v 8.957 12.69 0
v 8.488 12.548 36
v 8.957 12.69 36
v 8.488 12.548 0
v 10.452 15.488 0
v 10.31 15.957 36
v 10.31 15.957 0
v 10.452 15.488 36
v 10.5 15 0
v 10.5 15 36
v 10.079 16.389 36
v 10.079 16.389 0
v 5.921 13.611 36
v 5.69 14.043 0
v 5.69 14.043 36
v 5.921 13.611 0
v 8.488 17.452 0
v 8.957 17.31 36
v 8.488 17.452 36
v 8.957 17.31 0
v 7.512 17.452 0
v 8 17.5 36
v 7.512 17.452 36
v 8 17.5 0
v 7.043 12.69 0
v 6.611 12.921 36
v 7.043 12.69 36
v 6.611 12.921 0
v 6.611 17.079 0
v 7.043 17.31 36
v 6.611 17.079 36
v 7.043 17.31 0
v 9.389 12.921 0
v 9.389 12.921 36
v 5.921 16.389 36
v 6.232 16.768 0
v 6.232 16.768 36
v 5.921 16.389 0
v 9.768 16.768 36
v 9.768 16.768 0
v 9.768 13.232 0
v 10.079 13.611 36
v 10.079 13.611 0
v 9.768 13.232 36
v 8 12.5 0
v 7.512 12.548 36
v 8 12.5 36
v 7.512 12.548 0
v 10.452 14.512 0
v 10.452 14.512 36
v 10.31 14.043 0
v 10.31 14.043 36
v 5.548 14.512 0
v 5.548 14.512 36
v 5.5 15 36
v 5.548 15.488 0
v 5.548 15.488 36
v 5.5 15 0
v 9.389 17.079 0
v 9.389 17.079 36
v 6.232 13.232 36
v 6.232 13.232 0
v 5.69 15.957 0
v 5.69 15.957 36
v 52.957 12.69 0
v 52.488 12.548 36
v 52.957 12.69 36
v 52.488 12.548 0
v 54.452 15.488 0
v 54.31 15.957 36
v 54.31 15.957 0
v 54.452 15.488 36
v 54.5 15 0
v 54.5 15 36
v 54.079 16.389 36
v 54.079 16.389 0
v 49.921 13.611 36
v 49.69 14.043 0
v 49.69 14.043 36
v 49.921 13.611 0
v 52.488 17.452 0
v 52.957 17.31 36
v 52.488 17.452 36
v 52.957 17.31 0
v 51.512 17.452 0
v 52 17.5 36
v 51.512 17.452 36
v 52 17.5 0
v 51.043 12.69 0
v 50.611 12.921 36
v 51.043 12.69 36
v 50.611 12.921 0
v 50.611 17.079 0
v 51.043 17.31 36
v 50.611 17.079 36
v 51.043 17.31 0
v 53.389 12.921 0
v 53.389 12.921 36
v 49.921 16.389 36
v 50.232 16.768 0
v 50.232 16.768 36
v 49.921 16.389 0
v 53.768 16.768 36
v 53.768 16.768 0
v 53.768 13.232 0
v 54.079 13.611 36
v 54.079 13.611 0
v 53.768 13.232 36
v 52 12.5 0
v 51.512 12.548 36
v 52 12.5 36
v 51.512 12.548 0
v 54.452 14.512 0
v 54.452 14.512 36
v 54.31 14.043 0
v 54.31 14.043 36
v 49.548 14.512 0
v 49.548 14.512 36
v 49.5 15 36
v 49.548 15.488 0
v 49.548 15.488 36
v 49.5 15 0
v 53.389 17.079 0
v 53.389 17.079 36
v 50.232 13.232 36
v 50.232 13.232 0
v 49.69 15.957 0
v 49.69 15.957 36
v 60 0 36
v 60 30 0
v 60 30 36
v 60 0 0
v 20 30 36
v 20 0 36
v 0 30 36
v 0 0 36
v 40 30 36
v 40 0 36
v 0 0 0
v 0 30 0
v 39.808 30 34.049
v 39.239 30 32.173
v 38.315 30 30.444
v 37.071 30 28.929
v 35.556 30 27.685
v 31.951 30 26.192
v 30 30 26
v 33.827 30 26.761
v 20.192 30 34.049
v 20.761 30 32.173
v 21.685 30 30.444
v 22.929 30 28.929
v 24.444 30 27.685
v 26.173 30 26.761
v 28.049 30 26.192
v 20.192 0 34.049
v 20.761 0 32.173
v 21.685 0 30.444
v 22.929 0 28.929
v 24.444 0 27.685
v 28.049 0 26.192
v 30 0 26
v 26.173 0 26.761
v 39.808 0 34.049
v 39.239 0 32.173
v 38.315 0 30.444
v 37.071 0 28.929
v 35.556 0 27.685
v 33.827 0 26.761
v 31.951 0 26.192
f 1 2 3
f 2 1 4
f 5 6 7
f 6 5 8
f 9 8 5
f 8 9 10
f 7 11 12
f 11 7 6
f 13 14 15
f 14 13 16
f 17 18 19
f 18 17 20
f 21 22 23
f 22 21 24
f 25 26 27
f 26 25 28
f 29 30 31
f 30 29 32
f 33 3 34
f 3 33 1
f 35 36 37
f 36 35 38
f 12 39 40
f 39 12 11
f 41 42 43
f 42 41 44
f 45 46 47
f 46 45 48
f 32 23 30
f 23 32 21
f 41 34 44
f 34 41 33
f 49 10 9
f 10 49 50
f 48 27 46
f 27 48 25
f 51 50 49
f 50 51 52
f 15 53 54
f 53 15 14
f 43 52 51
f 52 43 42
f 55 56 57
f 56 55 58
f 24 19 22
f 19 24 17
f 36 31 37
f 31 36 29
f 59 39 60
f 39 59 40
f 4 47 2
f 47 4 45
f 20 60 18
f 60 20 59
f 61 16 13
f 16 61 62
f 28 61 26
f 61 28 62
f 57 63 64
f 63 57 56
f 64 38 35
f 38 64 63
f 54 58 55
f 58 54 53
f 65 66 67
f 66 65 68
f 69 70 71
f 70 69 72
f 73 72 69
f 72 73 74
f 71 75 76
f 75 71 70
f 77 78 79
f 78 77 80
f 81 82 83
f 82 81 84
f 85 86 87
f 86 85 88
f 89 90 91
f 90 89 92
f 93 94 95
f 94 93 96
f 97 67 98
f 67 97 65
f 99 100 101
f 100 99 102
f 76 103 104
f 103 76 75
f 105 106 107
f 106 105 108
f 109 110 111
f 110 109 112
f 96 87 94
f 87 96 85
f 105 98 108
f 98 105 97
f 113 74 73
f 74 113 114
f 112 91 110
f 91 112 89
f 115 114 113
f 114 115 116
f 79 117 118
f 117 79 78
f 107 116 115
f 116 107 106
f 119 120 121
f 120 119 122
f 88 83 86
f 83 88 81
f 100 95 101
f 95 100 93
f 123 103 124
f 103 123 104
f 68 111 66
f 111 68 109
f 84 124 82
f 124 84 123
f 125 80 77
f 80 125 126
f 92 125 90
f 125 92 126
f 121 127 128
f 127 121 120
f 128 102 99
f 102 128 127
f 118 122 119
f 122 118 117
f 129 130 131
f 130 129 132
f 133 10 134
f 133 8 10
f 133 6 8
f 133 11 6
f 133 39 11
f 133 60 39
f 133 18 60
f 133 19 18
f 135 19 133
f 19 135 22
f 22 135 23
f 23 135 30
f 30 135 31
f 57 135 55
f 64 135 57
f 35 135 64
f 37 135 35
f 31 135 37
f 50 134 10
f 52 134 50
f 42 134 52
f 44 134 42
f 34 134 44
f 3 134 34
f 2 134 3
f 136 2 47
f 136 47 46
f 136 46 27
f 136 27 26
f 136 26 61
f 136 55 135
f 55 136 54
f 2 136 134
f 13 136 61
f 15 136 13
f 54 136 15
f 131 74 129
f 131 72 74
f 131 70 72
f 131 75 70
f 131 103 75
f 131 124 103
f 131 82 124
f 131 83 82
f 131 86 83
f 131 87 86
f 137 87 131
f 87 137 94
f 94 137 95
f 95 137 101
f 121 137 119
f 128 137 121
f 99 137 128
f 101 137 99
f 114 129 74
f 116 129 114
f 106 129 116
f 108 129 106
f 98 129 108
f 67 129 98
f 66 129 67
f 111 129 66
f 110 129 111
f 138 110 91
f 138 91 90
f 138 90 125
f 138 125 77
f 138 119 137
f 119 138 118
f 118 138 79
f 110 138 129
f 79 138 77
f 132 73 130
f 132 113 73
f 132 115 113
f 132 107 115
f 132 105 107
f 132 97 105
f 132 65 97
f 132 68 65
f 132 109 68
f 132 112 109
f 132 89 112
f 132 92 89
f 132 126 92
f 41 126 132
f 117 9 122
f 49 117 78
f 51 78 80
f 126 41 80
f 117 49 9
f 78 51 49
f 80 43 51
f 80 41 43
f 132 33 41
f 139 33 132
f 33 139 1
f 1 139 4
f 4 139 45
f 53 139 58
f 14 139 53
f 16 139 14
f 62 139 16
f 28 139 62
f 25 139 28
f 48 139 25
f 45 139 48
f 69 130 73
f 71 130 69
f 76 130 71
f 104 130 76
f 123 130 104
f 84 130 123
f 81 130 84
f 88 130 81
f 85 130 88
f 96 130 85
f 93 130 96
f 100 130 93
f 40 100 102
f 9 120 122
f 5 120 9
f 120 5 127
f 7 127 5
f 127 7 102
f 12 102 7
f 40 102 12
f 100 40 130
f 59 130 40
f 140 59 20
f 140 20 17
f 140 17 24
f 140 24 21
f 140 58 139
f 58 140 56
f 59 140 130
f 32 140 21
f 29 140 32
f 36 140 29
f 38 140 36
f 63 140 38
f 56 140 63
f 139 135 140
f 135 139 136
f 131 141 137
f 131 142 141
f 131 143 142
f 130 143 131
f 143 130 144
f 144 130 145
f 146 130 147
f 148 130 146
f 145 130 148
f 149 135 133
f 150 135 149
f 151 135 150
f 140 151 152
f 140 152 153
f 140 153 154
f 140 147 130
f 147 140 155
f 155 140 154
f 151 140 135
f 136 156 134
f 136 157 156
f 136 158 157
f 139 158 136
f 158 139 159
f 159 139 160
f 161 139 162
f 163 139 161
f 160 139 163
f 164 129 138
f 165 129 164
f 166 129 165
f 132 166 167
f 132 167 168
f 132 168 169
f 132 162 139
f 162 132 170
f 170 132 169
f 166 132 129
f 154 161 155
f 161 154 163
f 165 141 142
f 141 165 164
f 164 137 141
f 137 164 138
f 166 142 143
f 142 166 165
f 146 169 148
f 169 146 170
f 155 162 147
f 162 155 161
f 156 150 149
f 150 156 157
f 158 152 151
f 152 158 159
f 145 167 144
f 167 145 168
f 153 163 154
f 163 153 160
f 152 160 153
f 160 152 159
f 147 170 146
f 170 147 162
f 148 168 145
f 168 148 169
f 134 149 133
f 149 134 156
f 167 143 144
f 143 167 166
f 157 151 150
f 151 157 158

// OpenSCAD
$fn = 32;

// ----------------------------------------------------------------------
// Saddle clamp: plain shaft clamp
// ----------------------------------------------------------------------

// --- parameters (mm) ---
blk_l = 60;               // block length, X
blk_w = 30;               // block width, Y
blk_h = 36;               // block height
clamp_r = 10;             // shaft groove radius
hole_r = 2.5;             // bolt hole radius
hole_m = 8;               // bolt hole margin from the ends

saw_depth = clamp_r + 3;  // saw kerf depth

difference() {
  cube([blk_l, blk_w, blk_h]);
  translate([blk_l / 2, -1, blk_h])
    rotate([-90, 0, 0])
      cylinder(h = blk_w + 2, r = clamp_r);
  for (sx = [0, 1])
    translate([sx ? blk_l - hole_m : hole_m, blk_w / 2, -1])
      cylinder(r = hole_r, h = blk_h + 2);
}
